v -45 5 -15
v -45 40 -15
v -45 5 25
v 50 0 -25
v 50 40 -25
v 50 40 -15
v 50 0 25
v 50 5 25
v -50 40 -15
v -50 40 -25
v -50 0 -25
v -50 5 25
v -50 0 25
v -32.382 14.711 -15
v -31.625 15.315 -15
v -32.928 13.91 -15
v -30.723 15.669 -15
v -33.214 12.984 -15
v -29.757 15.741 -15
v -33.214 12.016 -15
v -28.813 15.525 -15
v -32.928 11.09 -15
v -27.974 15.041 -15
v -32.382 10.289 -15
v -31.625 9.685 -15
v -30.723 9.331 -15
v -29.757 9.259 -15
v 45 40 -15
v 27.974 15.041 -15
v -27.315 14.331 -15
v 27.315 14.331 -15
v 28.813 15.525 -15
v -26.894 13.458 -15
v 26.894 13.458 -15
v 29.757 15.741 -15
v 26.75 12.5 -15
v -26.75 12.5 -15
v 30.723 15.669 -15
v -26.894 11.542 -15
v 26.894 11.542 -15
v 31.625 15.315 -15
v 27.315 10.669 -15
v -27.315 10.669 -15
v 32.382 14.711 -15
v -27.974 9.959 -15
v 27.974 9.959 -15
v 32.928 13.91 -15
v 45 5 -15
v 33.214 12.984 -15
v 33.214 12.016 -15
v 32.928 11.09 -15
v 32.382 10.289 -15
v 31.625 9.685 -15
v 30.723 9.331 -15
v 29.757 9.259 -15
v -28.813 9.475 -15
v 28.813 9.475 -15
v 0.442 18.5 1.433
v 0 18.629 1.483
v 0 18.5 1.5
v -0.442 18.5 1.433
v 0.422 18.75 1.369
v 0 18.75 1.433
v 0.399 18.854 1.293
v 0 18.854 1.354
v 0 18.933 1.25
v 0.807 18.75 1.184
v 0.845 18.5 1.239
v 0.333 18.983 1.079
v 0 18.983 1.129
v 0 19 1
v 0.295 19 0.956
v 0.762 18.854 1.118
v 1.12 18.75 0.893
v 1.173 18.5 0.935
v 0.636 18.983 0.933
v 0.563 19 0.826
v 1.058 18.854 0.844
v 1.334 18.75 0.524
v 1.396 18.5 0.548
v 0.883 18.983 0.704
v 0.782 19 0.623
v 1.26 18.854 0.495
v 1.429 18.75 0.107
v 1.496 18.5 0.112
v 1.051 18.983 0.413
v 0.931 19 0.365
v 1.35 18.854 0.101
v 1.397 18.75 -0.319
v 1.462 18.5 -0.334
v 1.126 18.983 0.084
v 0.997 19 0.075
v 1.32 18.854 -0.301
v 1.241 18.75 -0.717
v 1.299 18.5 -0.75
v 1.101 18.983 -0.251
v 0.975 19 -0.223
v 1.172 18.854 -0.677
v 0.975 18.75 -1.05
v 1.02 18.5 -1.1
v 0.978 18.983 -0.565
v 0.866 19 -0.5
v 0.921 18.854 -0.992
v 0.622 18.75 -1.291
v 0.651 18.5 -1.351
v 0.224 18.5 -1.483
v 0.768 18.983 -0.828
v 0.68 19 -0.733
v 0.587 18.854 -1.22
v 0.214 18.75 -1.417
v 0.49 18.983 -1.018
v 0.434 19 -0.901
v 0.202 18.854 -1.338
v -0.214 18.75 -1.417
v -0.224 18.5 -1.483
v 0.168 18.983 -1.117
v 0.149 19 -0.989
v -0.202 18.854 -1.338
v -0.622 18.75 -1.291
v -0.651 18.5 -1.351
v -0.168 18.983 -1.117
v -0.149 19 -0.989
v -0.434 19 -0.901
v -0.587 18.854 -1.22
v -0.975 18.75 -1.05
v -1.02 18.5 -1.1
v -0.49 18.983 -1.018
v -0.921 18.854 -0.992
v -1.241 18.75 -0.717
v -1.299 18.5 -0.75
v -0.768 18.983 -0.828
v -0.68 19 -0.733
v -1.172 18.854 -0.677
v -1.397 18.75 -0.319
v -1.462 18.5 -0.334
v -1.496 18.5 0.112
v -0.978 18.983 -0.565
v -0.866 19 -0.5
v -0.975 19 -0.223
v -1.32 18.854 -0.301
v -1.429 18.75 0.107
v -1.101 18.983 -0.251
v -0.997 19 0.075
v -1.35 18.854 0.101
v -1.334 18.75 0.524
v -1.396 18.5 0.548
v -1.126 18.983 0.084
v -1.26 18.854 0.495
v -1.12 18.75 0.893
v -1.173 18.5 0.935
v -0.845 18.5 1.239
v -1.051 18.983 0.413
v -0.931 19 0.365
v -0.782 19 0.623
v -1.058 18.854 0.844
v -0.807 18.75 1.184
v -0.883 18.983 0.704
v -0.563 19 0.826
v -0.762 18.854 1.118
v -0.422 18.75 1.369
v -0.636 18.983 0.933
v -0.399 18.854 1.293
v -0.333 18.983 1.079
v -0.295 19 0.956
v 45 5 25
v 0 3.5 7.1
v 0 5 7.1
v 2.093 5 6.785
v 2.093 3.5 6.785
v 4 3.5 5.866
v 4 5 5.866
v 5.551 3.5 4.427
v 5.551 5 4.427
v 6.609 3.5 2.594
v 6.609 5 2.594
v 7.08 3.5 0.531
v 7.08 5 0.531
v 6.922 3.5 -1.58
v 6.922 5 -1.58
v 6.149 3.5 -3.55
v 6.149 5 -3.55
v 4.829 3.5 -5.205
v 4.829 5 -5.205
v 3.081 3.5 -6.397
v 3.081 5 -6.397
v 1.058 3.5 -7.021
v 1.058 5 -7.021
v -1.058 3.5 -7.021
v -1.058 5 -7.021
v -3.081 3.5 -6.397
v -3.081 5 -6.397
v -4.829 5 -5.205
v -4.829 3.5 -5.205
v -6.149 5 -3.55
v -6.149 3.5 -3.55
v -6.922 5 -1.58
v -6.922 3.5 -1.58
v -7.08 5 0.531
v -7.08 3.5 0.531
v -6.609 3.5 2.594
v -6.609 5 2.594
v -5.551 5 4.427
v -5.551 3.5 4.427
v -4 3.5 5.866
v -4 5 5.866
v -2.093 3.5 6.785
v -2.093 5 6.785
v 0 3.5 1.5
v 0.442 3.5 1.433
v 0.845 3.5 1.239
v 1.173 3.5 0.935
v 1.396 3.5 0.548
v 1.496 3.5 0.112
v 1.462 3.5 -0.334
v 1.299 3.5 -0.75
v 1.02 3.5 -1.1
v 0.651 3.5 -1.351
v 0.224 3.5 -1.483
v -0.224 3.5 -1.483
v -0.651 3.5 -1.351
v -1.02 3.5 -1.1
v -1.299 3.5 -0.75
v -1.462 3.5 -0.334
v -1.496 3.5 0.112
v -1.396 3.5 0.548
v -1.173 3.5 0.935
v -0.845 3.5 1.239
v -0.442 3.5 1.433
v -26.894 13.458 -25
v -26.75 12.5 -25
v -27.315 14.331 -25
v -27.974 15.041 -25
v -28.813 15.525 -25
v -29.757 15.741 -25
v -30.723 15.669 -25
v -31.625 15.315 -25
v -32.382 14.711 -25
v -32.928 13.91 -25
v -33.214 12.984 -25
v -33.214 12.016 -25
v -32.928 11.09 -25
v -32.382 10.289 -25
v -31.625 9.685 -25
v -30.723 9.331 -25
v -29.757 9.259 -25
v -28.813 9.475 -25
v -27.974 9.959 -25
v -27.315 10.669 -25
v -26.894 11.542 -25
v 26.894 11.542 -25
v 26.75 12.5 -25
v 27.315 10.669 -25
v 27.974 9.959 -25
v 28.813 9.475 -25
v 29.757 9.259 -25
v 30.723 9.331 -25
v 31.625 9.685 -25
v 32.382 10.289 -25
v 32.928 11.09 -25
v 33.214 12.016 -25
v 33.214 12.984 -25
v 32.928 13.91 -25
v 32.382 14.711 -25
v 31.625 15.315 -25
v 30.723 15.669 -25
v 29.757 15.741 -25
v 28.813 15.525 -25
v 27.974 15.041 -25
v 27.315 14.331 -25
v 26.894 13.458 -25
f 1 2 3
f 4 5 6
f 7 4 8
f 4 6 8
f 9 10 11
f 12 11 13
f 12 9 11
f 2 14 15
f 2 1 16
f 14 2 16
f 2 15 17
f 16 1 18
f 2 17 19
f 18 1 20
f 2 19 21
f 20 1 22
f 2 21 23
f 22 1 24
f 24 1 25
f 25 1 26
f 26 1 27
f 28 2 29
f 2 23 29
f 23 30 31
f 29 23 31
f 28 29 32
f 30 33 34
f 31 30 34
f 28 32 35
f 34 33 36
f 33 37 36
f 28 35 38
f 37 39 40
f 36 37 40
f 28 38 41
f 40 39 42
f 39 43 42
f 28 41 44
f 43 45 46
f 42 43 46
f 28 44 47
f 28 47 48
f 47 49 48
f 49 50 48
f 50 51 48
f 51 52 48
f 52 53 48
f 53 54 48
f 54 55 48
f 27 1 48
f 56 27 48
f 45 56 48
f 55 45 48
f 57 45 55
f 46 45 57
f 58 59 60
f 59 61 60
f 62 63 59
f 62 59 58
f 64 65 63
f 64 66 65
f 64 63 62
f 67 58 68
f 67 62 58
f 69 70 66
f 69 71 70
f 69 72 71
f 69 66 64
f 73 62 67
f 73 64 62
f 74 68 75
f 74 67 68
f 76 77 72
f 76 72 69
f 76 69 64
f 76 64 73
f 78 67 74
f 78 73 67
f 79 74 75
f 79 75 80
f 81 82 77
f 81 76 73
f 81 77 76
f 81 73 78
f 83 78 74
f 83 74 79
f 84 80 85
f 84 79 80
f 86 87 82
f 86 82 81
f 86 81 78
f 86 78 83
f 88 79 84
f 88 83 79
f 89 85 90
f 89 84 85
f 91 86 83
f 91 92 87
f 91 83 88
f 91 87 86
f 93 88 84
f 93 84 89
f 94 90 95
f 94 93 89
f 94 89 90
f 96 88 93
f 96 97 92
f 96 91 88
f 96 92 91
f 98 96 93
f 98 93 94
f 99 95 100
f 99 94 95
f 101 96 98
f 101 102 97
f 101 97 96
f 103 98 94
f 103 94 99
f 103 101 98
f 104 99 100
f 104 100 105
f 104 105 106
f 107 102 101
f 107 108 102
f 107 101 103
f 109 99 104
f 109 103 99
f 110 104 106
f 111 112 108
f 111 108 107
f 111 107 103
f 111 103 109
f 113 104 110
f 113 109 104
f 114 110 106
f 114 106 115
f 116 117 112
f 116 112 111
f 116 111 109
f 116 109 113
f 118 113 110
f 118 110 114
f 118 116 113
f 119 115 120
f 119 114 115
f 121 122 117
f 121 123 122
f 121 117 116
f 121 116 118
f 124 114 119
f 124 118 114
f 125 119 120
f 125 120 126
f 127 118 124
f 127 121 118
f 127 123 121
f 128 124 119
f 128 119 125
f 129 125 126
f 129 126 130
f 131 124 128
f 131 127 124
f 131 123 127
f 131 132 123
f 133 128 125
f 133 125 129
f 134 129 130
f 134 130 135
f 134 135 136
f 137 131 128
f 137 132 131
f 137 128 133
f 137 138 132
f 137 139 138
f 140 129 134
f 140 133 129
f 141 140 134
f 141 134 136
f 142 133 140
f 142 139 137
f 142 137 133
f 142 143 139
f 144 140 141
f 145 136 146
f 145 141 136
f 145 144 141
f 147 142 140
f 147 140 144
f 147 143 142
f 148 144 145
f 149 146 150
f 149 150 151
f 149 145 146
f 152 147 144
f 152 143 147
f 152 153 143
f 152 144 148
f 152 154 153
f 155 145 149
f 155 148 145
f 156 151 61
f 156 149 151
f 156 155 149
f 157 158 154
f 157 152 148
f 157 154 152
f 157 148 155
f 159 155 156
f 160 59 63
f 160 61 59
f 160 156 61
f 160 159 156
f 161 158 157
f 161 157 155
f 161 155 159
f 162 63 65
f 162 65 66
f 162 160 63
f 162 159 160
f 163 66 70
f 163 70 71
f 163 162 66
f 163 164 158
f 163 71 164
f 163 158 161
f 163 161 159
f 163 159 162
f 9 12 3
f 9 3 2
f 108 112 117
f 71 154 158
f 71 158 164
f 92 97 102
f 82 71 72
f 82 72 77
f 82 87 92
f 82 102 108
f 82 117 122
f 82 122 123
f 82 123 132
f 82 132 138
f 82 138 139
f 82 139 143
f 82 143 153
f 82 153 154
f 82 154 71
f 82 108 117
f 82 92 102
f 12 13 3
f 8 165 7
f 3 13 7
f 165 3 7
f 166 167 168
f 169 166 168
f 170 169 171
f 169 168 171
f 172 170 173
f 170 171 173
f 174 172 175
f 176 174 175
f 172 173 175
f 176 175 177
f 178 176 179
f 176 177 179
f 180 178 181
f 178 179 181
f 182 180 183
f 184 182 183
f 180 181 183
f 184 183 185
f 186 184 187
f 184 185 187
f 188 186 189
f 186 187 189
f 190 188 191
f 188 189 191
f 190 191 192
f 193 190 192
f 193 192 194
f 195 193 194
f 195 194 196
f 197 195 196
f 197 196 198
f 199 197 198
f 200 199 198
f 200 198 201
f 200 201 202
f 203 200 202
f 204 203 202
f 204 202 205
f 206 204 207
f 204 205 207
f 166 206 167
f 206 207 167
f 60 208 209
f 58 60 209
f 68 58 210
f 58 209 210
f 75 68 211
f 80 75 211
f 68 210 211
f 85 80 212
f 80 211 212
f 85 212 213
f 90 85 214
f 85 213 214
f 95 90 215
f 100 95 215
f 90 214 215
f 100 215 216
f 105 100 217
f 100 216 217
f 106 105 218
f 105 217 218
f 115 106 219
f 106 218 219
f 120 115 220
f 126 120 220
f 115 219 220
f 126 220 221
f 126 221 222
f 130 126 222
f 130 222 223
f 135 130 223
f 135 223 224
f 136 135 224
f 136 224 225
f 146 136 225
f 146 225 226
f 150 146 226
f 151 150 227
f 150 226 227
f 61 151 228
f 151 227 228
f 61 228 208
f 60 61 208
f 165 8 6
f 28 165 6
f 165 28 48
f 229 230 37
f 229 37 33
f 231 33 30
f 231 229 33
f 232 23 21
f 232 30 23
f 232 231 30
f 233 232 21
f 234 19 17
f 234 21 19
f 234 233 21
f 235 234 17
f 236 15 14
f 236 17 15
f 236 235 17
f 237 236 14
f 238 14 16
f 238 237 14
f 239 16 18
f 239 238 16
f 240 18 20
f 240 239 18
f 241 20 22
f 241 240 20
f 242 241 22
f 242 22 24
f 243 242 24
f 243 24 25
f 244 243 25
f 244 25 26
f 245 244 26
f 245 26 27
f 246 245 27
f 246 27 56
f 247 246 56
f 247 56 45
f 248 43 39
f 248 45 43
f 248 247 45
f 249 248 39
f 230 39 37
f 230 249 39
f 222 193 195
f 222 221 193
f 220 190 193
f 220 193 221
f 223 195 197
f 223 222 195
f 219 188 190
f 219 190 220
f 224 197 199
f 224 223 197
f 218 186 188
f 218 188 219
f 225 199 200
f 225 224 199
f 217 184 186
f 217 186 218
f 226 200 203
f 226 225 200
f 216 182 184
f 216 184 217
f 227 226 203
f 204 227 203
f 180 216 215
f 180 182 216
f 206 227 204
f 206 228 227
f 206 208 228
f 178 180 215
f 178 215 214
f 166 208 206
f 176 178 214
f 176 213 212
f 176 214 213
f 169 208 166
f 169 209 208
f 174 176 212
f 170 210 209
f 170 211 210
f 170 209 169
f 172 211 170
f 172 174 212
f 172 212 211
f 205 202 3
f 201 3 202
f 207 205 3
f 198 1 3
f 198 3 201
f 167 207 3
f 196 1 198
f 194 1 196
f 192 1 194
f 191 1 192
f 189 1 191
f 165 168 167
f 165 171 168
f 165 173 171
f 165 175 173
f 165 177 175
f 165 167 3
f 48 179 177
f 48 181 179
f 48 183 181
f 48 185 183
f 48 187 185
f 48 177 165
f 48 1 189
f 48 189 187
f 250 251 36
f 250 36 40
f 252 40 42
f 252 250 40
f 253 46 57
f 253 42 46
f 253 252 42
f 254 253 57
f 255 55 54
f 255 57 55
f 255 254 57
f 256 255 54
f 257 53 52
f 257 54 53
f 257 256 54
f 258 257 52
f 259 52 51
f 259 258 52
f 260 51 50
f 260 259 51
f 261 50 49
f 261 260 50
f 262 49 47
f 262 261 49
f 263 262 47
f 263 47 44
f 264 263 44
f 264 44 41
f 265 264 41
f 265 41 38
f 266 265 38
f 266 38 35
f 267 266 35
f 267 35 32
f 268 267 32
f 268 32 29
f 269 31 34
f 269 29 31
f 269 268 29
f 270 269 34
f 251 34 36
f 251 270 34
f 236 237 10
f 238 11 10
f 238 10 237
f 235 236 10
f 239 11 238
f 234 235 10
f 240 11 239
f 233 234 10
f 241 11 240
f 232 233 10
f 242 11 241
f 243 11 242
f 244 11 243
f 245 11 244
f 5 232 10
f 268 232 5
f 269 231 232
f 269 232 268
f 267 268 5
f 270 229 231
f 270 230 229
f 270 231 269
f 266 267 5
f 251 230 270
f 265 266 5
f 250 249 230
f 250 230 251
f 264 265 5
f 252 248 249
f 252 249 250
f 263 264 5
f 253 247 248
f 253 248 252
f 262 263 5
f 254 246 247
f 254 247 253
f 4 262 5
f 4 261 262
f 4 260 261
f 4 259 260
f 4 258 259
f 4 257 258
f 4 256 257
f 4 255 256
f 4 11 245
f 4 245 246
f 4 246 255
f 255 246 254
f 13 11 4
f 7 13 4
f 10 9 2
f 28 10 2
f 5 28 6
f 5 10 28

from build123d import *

# Parameters (mm, degrees)
SKETCH1_W               = 100
SKETCH1_H               = 50
BOSS_EXTRUDE1_DEPTH     = 5
SKETCH2_W               = 100
SKETCH2_H               = 10
BOSS_EXTRUDE2_DEPTH     = 40
CUT_EXTRUDE1_DEPTH      = 76.498344353
CUT_EXTRUDE1_DEPTH_BACK = 76.498344353
SKETCH4_3_R             = 3.25
CUT_EXTRUDE2_DEPTH      = 76.498344353
CUT_EXTRUDE2_DEPTH_BACK = 76.498344353
SKETCH4_R               = 3.25
BOSS_EXTRUDE5_DEPTH     = 5
SKETCH9_R               = 7.1
CUT_EXTRUDE3_DEPTH      = 1.5
SKETCH10_R              = 1.5
BOSS_EXTRUDE6_DEPTH     = 15.5
FILLET1_R               = 0.5


with BuildPart() as part:
    # Sketch1 → Boss-Extrude1 (new body)
    with BuildSketch(Plane(origin=(0, 0, 0), x_dir=(1, 0, 0), z_dir=(0, 1, 0))):
        Rectangle(SKETCH1_W, SKETCH1_H)
    extrude(amount=BOSS_EXTRUDE1_DEPTH)

    # Sketch2 → Boss-Extrude2 (add)
    with BuildSketch(Plane(origin=(0, 0, 0), x_dir=(1, 0, 0), z_dir=(0, 1, 0))):
        with Locations((0, 20)):
            Rectangle(SKETCH2_W, SKETCH2_H)
    extrude(amount=BOSS_EXTRUDE2_DEPTH)

    # Sketch4<3> → Cut-Extrude1 (cut, two sides: drawn at the far end of the back side and taken through both)
    with BuildSketch(Plane.XY.offset(-15).offset(-CUT_EXTRUDE1_DEPTH_BACK)):
        with Locations((-30, 12.5)):
            Circle(SKETCH4_3_R)
    extrude(amount=CUT_EXTRUDE1_DEPTH + CUT_EXTRUDE1_DEPTH_BACK, mode=Mode.SUBTRACT)

    # Sketch4 → Cut-Extrude2 (cut, two sides: drawn at the far end of the back side and taken through both)
    with BuildSketch(Plane.XY.offset(-15).offset(-CUT_EXTRUDE2_DEPTH_BACK)):
        with Locations((30, 12.5)):
            Circle(SKETCH4_R)
    extrude(amount=CUT_EXTRUDE2_DEPTH + CUT_EXTRUDE2_DEPTH_BACK, mode=Mode.SUBTRACT)

    # Sketch8 → Boss-Extrude5 (add)
    with BuildSketch(Plane(origin=(50, 0, 0), x_dir=(0, 0, -1), z_dir=(1, 0, 0))):
        Polygon((15, 40), (15, 5), (-25, 5), align=None)
    boss_extrude5 = extrude(amount=-BOSS_EXTRUDE5_DEPTH)

    # Mirror1: Boss-Extrude5 across plane
    add(boss_extrude5.mirror(Plane(origin=(0, 0, 0), x_dir=(0, 0, 1), z_dir=(1, 0, 0))))

    # Sketch9 → Cut-Extrude3 (cut)
    with BuildSketch(Plane(origin=(0, 5, 0), x_dir=(1, 0, 0), z_dir=(0, 1, 0))):
        Circle(SKETCH9_R)
    extrude(amount=-CUT_EXTRUDE3_DEPTH, mode=Mode.SUBTRACT)

    # Sketch10 → Boss-Extrude6 (add)
    with BuildSketch(Plane(origin=(0, 3.5, 0), x_dir=(1, 0, 0), z_dir=(0, 1, 0))):
        Circle(SKETCH10_R)
    extrude(amount=BOSS_EXTRUDE6_DEPTH)

    # Fillet1
    fillet1_edges = [part.edges().sort_by_distance(p)[0] for p in [
        (-1.5, 19, 0),
    ]]
    fillet(fillet1_edges, radius=FILLET1_R)


solid = part.part
